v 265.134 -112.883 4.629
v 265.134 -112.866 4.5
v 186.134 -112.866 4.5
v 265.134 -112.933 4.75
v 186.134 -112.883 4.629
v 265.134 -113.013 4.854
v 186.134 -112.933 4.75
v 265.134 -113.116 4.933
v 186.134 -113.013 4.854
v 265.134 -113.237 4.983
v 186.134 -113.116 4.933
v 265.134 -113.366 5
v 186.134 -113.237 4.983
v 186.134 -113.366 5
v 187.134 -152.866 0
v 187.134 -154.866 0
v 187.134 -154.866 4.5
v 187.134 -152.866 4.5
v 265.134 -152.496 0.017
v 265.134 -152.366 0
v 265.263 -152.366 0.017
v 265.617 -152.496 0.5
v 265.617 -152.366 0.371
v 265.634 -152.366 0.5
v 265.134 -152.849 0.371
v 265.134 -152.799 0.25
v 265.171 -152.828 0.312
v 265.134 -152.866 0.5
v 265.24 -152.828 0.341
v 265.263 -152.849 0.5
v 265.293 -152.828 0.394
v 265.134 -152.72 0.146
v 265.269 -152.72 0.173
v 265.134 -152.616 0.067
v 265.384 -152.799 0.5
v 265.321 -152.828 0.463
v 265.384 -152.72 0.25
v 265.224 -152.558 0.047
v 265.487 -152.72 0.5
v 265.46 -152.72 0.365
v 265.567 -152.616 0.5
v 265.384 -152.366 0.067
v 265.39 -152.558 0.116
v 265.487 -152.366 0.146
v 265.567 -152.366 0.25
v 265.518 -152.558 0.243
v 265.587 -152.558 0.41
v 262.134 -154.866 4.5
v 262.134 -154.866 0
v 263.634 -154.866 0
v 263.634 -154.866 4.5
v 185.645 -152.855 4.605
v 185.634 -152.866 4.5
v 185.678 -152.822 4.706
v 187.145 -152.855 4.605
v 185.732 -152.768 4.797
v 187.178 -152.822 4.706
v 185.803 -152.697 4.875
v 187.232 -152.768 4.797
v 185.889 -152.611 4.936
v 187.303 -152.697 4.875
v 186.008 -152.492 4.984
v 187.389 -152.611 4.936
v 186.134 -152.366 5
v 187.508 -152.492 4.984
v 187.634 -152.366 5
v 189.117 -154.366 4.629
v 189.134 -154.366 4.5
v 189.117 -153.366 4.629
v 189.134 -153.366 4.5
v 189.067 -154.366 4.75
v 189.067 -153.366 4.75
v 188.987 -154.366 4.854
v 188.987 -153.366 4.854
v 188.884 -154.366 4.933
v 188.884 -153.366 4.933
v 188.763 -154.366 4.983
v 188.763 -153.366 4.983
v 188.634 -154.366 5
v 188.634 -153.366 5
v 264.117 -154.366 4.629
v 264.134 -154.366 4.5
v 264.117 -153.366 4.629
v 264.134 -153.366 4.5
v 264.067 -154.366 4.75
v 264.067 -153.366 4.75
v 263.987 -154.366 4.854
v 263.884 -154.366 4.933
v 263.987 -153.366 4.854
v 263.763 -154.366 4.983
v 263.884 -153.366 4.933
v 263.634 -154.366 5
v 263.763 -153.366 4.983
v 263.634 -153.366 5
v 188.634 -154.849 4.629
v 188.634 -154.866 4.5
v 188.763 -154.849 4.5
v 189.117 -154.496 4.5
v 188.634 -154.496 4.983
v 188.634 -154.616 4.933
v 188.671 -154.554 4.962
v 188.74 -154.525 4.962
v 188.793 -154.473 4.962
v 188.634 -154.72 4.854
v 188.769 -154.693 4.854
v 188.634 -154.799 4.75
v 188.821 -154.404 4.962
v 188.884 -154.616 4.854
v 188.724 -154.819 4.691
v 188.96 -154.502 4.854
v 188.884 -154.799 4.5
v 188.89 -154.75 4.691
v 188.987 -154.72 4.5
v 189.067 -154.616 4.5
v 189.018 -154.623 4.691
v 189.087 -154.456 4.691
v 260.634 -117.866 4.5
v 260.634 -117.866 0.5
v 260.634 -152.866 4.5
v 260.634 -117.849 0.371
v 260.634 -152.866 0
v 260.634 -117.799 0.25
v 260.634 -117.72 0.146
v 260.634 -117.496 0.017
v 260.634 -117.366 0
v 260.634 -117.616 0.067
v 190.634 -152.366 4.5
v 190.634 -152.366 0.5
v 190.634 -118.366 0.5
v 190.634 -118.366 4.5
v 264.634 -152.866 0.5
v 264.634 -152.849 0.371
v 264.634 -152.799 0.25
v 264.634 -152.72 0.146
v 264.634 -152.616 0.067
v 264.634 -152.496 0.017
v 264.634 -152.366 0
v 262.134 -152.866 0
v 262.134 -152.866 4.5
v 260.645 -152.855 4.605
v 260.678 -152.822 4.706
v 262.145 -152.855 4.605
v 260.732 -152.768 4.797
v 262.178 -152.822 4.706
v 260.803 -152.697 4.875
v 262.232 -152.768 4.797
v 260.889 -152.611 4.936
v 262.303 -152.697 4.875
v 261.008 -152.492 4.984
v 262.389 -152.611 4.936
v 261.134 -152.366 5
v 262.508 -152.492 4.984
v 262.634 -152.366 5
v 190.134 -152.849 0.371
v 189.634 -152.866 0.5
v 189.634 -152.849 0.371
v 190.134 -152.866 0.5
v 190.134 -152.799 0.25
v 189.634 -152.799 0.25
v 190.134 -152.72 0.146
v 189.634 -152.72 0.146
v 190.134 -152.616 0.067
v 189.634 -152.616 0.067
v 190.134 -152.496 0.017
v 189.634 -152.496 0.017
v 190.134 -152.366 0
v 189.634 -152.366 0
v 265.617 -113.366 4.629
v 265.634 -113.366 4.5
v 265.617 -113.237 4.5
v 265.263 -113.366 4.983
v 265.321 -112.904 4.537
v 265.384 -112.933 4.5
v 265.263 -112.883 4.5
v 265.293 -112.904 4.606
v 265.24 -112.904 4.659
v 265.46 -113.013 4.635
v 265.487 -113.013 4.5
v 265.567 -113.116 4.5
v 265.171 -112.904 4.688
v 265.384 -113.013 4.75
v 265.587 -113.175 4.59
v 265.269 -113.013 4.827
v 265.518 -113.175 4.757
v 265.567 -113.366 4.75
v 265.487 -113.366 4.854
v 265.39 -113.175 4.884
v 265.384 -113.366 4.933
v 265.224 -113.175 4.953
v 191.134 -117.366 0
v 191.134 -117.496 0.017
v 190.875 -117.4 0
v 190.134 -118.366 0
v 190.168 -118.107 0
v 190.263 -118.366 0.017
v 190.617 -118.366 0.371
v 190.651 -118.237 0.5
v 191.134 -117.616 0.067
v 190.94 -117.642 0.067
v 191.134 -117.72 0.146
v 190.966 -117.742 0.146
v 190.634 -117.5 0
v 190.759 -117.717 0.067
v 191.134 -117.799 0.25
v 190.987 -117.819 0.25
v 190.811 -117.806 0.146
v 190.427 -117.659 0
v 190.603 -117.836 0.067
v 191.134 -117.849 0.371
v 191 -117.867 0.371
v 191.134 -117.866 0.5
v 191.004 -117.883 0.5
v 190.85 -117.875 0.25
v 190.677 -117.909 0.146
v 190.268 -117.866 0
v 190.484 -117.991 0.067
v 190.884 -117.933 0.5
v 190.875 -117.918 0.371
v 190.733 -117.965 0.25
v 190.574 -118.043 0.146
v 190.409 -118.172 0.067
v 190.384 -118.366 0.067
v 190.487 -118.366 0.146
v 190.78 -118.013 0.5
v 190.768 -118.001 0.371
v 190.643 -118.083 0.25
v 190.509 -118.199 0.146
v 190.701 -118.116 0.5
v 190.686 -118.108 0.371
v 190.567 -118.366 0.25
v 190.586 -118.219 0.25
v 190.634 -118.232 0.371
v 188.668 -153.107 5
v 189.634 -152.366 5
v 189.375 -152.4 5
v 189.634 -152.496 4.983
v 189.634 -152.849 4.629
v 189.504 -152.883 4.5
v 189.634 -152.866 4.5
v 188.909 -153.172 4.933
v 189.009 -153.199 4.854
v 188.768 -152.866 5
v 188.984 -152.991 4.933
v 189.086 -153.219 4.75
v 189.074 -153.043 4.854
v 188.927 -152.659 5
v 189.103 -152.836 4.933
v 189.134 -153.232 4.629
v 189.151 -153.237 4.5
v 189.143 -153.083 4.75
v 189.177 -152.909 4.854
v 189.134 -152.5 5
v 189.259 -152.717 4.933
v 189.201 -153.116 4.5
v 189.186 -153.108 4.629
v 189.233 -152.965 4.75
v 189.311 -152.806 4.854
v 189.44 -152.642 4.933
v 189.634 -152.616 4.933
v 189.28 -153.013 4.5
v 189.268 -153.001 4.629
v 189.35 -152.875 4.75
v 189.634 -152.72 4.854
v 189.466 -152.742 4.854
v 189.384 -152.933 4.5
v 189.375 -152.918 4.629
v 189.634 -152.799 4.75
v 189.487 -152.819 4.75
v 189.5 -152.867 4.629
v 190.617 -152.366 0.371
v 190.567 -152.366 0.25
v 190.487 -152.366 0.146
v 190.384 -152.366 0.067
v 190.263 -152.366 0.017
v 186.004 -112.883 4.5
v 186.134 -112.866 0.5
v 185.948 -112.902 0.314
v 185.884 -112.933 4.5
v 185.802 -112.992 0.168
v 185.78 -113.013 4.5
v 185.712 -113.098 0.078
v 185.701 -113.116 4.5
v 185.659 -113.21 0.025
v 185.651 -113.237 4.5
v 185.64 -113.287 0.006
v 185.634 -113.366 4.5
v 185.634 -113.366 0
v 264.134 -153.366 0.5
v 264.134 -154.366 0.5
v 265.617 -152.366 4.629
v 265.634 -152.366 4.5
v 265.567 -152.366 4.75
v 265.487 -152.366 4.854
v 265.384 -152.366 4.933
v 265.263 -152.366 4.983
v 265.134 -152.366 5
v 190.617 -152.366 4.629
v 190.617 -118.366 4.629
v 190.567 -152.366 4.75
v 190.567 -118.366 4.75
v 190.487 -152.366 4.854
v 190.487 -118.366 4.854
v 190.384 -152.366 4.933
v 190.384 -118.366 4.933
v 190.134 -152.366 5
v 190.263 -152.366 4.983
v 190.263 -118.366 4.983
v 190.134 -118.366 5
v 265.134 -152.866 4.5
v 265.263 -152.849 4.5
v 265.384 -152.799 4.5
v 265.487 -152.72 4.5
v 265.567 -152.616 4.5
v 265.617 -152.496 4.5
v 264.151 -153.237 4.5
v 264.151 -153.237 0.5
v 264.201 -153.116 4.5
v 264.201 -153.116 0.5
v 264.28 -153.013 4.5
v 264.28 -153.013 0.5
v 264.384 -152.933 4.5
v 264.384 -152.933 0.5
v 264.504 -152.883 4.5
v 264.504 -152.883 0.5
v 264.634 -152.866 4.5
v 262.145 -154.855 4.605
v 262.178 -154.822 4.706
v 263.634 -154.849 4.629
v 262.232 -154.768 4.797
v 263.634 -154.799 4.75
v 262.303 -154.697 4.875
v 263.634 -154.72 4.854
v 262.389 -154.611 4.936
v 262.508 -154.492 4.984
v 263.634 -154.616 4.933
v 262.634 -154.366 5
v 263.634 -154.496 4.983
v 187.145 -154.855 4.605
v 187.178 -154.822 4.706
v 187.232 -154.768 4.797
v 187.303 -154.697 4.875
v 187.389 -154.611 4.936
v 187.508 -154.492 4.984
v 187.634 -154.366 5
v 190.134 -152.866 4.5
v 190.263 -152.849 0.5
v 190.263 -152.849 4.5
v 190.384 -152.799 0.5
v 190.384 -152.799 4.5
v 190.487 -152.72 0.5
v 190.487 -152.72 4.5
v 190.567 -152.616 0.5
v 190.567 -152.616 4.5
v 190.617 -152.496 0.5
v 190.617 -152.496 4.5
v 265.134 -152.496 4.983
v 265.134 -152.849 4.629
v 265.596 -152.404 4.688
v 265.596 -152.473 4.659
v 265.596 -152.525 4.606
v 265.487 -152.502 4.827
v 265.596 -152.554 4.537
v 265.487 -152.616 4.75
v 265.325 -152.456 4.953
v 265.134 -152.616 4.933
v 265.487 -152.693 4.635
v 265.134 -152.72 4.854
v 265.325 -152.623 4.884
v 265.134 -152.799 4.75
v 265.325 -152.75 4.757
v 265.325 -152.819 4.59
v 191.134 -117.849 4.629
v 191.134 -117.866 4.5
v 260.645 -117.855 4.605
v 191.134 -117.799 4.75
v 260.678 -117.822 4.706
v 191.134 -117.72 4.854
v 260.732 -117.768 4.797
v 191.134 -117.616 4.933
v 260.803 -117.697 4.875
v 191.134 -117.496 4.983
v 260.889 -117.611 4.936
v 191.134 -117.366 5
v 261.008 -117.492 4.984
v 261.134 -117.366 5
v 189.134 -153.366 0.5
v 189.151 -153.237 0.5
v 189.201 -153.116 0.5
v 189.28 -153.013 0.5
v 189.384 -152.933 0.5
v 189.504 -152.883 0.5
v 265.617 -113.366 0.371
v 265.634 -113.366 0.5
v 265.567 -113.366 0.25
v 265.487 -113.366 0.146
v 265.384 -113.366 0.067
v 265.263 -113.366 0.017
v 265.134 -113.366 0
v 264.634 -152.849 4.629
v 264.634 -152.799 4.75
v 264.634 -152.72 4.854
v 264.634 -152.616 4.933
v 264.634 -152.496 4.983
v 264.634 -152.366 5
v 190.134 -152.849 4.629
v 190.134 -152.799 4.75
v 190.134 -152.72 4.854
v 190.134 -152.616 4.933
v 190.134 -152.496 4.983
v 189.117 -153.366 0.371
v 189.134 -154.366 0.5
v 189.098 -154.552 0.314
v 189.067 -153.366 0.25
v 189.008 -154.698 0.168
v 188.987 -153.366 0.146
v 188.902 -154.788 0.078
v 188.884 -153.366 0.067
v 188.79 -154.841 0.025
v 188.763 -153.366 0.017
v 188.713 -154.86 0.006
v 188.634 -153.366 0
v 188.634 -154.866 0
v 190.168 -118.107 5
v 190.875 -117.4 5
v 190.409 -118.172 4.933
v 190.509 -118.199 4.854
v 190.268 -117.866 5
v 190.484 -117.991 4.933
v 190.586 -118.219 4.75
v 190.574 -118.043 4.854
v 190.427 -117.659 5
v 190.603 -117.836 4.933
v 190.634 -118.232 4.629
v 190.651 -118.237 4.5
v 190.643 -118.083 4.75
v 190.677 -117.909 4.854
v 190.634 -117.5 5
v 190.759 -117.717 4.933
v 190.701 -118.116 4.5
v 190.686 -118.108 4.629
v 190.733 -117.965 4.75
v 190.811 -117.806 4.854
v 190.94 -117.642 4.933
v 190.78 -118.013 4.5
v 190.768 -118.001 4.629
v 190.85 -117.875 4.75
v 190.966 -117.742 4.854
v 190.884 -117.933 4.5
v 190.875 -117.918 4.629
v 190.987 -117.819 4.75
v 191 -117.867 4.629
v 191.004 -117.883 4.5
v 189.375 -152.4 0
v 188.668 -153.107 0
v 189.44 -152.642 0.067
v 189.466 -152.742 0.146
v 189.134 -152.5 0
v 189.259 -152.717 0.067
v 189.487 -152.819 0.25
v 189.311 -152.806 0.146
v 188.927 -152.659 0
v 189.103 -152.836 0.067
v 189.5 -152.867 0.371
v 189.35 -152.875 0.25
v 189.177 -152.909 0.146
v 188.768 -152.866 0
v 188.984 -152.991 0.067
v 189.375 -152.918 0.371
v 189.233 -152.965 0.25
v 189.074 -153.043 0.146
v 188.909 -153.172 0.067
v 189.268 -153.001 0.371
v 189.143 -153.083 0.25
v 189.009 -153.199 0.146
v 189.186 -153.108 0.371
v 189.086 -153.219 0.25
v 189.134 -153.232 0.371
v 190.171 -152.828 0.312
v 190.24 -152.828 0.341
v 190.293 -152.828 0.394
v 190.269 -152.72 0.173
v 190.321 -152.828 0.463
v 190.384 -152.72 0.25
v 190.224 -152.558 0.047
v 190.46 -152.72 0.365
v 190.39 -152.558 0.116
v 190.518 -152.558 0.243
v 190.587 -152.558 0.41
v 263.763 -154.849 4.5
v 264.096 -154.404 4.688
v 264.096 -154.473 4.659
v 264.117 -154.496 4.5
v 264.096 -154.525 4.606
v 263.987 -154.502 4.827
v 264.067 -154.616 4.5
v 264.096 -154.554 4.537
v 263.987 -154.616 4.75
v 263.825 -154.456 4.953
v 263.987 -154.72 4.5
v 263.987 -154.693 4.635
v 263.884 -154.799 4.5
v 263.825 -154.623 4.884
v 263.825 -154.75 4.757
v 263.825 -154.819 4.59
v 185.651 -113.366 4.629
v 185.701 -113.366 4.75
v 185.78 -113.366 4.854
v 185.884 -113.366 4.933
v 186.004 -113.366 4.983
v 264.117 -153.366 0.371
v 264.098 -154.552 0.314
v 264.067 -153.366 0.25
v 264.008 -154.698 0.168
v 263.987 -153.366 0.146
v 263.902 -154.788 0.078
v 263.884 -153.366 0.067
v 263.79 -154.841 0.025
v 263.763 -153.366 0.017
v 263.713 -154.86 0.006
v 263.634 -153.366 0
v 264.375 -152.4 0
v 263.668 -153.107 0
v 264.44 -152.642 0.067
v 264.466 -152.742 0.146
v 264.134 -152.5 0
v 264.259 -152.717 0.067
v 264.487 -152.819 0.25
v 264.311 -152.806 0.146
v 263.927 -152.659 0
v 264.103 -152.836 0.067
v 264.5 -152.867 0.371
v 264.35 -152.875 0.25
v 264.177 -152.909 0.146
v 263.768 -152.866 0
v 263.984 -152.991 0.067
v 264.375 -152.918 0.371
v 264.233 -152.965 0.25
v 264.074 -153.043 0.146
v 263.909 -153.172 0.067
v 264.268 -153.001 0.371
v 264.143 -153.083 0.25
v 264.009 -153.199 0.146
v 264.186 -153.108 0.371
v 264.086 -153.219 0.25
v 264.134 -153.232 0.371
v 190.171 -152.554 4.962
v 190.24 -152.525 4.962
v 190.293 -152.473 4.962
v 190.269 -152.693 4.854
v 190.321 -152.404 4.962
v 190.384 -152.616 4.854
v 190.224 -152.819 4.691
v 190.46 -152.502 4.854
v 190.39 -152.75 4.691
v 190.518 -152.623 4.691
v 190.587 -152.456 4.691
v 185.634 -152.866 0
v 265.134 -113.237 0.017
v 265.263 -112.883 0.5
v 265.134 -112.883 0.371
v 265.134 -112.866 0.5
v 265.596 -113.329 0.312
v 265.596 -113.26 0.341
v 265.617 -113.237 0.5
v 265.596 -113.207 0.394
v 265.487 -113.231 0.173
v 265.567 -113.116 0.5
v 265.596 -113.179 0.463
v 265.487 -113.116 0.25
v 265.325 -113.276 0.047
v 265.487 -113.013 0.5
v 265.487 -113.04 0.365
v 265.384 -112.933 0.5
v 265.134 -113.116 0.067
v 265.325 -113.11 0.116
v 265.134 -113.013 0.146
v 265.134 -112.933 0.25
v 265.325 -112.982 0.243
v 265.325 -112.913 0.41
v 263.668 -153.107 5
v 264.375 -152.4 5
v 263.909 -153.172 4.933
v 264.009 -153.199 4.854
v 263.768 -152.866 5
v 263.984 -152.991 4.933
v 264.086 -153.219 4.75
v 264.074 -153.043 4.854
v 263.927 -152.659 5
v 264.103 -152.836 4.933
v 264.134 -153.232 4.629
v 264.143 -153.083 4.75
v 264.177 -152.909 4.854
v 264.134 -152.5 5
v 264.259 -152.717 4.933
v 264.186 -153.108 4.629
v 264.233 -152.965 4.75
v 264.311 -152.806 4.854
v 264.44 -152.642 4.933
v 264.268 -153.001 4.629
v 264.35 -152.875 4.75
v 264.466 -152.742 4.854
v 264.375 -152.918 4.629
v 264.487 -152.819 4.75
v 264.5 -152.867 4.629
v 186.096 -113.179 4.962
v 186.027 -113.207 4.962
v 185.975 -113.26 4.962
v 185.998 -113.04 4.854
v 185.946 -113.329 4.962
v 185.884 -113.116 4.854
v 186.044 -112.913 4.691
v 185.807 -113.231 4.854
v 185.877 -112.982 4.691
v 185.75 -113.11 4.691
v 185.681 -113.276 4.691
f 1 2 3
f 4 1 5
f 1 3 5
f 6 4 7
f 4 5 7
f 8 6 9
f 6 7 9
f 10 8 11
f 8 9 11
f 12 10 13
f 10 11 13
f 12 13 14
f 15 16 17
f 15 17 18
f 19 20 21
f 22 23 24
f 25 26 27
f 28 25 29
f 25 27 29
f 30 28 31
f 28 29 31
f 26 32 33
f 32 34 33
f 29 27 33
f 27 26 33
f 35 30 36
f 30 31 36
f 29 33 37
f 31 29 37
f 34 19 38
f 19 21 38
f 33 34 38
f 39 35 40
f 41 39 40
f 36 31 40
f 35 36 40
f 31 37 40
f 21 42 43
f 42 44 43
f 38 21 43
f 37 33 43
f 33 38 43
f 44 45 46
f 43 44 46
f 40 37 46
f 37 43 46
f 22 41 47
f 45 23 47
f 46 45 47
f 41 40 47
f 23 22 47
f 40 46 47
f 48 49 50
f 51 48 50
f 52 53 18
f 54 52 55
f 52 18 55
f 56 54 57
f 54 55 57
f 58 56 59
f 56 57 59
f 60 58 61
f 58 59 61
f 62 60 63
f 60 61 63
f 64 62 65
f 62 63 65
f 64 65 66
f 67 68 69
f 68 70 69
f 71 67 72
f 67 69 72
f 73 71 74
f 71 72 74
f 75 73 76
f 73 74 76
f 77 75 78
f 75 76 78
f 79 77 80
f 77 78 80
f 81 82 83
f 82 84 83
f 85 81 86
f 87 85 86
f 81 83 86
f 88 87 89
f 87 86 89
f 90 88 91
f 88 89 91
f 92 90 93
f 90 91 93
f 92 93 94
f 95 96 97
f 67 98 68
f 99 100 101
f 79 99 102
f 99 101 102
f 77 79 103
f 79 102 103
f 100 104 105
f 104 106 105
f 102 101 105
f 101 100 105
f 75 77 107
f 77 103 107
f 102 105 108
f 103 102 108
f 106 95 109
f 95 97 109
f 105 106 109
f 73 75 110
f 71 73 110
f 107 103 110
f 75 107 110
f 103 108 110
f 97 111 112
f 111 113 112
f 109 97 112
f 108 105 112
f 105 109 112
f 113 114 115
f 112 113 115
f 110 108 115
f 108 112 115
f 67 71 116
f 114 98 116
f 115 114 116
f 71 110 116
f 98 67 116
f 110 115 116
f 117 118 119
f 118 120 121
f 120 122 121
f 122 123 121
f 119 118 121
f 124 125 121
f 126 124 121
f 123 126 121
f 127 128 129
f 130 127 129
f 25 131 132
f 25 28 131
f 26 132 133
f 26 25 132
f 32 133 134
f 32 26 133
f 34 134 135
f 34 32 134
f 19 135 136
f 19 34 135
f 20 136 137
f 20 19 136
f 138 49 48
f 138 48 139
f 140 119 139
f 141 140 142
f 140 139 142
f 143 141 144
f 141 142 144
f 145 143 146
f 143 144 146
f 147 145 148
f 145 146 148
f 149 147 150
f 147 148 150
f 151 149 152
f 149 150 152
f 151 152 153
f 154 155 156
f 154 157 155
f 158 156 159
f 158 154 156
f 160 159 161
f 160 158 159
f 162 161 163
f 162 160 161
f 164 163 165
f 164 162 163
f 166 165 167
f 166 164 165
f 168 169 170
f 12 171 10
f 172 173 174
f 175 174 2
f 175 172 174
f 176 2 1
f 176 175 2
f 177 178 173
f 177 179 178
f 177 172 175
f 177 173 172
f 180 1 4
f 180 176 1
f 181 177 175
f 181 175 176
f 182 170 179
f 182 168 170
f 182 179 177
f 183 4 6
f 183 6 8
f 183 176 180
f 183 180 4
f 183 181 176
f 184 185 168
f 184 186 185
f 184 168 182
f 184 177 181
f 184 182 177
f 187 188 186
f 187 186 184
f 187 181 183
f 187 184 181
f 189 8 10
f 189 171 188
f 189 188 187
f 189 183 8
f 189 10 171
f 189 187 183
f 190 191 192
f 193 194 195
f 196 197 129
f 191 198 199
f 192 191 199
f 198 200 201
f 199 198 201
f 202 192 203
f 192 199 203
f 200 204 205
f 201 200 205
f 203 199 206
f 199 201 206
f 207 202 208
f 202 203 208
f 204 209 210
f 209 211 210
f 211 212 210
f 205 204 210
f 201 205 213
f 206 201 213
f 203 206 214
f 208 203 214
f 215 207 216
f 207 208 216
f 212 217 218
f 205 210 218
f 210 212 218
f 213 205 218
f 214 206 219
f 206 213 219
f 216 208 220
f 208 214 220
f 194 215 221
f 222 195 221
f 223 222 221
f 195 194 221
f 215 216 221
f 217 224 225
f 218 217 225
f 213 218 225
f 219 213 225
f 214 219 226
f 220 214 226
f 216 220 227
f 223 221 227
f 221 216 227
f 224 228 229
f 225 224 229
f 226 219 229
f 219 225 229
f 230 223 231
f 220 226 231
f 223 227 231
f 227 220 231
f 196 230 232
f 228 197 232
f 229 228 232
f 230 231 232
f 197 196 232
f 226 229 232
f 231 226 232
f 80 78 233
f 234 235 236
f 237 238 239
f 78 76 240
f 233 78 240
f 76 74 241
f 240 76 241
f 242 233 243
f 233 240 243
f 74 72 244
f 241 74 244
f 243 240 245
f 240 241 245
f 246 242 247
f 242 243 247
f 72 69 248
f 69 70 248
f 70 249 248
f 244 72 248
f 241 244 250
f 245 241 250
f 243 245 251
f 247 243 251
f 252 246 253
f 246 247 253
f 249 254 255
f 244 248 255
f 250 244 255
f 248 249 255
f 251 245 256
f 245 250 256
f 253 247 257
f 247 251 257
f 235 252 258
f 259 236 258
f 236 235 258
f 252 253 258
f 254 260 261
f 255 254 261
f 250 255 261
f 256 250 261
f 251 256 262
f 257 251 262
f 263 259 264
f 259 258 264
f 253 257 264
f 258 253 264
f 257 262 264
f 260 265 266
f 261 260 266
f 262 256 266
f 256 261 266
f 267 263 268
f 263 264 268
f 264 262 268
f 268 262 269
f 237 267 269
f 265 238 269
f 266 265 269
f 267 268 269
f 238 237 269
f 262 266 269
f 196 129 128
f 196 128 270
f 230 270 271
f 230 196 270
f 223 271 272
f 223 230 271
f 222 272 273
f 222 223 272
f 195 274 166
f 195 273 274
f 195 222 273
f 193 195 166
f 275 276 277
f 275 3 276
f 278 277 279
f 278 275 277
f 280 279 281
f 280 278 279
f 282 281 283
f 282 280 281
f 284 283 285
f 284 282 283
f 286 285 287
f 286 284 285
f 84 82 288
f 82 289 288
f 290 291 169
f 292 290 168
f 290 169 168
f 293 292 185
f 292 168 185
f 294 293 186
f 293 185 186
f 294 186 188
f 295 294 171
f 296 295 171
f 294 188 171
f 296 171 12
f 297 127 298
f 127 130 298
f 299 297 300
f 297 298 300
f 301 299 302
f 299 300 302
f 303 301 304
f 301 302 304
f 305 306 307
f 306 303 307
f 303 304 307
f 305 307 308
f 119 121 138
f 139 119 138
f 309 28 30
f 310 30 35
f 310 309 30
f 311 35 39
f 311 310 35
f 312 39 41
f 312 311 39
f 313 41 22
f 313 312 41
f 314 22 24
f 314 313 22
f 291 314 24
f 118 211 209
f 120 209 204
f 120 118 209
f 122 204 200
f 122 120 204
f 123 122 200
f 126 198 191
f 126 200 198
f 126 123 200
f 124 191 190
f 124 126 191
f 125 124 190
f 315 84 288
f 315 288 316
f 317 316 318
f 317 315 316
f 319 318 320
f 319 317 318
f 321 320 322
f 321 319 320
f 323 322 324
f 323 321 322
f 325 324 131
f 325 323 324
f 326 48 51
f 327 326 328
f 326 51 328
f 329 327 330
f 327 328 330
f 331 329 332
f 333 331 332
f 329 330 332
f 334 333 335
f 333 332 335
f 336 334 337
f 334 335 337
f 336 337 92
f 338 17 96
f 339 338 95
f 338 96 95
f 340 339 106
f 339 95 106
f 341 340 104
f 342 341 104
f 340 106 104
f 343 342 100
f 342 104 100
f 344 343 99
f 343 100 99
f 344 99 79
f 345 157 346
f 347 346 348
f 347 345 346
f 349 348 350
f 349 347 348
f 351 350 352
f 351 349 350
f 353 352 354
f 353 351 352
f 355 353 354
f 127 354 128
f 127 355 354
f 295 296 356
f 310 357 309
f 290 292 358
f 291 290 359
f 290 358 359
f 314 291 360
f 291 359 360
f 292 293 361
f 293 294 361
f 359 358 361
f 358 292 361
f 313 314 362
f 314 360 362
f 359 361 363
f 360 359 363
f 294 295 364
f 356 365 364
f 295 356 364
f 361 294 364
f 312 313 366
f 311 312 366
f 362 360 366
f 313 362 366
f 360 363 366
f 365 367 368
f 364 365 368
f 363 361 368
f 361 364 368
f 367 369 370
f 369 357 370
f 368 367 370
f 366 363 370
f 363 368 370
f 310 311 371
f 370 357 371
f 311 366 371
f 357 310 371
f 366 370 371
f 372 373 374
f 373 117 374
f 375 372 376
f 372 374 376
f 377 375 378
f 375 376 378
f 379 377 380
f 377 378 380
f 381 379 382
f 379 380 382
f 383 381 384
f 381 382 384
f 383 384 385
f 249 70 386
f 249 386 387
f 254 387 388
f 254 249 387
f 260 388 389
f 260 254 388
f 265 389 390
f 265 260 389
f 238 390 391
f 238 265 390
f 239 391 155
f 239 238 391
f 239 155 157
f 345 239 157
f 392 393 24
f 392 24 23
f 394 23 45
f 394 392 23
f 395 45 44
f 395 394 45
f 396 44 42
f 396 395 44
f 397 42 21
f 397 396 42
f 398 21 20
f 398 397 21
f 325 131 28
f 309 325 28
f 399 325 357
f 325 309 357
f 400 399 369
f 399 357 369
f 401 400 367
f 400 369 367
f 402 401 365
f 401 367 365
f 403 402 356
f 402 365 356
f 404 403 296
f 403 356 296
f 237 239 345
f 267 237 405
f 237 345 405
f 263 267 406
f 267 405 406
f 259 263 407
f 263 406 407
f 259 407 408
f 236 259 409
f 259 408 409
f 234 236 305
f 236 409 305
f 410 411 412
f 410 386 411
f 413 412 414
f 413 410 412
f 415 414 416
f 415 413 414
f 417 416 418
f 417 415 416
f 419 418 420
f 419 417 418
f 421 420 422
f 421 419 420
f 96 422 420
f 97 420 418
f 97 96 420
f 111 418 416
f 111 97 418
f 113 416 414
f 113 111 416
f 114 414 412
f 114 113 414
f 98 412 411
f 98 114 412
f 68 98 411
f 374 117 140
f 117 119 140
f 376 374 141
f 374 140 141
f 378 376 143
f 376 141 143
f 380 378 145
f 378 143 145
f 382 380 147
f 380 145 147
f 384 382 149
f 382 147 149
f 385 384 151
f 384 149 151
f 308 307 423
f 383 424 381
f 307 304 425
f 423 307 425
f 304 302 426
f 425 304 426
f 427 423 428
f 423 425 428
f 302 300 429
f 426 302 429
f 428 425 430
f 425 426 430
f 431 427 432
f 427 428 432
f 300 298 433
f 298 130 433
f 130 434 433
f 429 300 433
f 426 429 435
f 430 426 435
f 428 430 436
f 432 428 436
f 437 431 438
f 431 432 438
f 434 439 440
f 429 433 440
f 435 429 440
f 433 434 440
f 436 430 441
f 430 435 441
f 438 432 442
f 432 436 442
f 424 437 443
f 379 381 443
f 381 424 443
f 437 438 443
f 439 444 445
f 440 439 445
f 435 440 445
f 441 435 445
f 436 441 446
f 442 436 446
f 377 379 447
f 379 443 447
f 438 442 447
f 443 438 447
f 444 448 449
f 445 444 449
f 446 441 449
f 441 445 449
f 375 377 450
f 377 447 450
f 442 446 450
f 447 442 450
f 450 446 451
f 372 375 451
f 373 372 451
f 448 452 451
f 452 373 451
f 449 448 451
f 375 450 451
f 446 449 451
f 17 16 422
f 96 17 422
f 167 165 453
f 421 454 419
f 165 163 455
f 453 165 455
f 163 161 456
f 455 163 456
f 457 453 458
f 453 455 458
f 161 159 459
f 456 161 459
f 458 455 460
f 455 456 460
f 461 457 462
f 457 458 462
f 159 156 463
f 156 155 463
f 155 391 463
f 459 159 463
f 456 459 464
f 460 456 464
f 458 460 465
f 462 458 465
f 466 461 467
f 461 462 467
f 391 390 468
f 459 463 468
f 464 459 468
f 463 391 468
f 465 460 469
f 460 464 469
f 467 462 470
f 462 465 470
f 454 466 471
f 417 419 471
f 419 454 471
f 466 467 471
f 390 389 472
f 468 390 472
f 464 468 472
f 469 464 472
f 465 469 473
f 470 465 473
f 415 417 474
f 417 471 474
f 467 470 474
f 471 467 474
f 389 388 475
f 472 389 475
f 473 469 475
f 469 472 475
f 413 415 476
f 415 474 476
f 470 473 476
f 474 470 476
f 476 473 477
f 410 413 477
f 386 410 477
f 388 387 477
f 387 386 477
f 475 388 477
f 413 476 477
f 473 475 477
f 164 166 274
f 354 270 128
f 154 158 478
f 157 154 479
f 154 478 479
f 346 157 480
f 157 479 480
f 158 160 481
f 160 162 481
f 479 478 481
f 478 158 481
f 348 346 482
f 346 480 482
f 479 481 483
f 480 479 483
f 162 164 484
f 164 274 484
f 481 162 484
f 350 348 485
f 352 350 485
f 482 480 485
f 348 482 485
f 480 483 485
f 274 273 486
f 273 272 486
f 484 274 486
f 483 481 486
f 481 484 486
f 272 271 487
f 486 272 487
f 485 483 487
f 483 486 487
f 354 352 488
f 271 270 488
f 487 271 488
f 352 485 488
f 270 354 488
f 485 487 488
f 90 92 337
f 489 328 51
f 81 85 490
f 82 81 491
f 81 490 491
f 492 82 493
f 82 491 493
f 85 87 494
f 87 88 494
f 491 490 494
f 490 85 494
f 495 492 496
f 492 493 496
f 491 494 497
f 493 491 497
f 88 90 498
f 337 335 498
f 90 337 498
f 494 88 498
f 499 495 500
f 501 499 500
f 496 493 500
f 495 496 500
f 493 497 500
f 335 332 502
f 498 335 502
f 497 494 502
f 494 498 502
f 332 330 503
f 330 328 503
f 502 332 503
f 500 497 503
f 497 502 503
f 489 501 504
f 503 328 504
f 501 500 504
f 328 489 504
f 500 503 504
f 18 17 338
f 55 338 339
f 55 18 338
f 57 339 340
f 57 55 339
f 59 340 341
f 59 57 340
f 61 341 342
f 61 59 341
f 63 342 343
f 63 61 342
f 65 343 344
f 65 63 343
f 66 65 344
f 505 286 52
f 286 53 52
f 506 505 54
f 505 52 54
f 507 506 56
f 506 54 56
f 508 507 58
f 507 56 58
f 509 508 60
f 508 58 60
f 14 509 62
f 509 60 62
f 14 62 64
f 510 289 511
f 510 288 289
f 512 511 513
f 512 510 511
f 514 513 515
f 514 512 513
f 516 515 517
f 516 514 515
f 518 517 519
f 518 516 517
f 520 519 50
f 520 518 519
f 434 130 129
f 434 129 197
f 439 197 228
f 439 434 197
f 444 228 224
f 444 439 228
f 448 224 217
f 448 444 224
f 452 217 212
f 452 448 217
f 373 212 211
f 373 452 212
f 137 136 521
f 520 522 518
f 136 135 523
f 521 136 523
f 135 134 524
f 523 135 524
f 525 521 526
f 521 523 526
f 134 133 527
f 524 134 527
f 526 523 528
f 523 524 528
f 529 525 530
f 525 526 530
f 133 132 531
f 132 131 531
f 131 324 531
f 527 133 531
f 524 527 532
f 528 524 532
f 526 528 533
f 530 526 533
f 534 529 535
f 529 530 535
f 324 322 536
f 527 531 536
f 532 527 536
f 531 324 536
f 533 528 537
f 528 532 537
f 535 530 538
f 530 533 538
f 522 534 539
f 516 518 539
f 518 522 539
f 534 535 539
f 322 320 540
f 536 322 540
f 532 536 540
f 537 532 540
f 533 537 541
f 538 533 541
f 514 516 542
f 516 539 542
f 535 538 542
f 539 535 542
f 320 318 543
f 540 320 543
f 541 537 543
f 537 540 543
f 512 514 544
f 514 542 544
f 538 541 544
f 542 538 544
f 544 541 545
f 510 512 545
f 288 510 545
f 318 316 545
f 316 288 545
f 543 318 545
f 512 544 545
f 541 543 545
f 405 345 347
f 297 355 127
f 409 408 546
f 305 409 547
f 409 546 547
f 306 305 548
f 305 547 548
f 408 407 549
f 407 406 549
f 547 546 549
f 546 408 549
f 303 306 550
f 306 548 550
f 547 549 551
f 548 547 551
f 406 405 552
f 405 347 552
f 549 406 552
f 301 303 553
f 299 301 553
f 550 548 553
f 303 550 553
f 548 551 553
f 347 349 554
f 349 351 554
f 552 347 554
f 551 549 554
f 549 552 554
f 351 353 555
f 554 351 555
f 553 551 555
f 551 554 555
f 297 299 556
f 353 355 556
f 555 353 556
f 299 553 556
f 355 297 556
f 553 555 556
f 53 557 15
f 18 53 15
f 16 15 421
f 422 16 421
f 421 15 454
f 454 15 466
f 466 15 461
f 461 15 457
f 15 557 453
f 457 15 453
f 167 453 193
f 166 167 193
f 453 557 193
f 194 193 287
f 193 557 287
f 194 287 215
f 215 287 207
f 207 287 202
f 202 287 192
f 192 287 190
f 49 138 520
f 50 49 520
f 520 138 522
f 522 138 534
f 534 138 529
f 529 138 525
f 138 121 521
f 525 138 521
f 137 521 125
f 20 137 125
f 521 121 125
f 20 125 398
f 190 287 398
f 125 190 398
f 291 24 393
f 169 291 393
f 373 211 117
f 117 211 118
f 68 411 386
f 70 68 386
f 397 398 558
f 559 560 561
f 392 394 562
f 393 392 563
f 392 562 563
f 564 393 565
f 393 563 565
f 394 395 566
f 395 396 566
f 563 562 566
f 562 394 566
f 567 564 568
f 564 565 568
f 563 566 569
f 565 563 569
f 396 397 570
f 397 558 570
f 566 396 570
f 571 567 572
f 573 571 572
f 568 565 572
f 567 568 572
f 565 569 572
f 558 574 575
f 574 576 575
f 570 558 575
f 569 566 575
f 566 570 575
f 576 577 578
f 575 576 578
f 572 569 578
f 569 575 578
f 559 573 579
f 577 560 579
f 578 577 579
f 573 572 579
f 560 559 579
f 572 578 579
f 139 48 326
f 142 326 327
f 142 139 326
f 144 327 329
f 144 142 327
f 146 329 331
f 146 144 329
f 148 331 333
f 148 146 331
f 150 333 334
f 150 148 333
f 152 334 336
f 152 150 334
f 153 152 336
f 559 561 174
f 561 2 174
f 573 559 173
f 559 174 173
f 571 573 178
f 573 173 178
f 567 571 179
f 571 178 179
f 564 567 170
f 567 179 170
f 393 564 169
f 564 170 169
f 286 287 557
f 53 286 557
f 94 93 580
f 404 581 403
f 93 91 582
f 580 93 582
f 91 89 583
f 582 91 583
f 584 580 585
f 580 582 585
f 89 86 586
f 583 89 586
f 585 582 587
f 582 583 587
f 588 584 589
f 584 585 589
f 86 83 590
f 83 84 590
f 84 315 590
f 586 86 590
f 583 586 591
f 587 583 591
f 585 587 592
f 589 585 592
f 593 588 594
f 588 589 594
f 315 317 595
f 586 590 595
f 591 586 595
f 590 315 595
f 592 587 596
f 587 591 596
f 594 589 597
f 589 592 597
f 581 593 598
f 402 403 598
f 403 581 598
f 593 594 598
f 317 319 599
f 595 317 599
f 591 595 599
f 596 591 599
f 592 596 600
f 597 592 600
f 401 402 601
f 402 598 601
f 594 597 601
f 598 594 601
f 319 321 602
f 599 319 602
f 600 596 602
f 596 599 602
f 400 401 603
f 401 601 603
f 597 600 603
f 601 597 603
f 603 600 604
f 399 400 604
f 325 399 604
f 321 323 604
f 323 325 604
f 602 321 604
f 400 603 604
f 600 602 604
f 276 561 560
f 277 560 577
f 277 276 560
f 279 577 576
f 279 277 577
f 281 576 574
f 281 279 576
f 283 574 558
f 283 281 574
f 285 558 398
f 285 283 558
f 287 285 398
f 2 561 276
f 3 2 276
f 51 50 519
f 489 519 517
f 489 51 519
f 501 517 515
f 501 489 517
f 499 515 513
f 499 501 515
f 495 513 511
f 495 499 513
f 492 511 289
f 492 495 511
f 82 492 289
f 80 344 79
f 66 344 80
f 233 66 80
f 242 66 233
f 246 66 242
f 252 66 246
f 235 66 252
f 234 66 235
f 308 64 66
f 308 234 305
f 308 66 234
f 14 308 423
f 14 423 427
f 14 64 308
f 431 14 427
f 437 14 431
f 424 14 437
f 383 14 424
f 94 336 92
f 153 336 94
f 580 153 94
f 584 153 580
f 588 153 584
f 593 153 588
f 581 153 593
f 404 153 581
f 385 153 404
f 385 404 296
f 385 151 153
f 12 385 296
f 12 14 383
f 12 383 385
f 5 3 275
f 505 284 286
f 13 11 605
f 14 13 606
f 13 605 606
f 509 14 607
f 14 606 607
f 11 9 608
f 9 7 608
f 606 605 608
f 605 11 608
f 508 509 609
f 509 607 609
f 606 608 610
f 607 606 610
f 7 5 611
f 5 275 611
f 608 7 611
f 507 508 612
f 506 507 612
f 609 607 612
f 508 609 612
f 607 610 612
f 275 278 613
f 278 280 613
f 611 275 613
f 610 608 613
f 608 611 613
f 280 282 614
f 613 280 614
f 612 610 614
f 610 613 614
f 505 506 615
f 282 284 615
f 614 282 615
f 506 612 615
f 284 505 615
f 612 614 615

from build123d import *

# Parameters (mm, degrees)
SKETCH1_W           = 2
SKETCH1_H           = 2
BOSS_EXTRUDE1_DEPTH = 5
FILLET1_R           = 0.5


with BuildPart() as part:
    # Sketch1 → Boss-Extrude1 (new body)
    with BuildSketch(Plane.XY):
        Polygon((265.633757962, -112.866242038), (185.633757962, -112.866242038), (185.633757962, -152.866242038), (187.133757962, -152.866242038), (189.133757962, -152.866242038), (190.633757962, -152.866242038), (190.633757962, -117.866242038), (260.633757962, -117.866242038), (260.633757962, -152.866242038), (262.133757962, -152.866242038), (264.133757962, -152.866242038), (265.633757962, -152.866242038), align=None)
        with Locations((188.133757962, -153.866242038)):
            Rectangle(SKETCH1_W, SKETCH1_H)
        with Locations((263.133757962, -153.866242038)):
            Rectangle(SKETCH1_W, SKETCH1_H)
    extrude(amount=BOSS_EXTRUDE1_DEPTH)

    # Fillet1
    fillet1_edges = [part.edges().sort_by_distance(p)[0] for p in [
        (262.133757962, -153.866242038, 5),
        (225.633757962, -117.866242038, 0),
        (190.633757962, -135.366242038, 0),
        (263.133757962, -154.866242038, 5),
        (189.883757962, -152.866242038, 0),
        (189.133757962, -153.866242038, 0),
        (225.633757962, -112.866242038, 0),
        (265.633757962, -132.866242038, 0),
        (264.133757962, -153.866242038, 5),
        (264.883757962, -152.866242038, 0),
        (264.133757962, -153.866242038, 0),
        (264.883757962, -152.866242038, 5),
        (265.633757962, -132.866242038, 5),
        (190.633757962, -117.866242038, 2.5),
        (190.633757962, -152.866242038, 2.5),
        (189.133757962, -152.866242038, 2.5),
        (189.133757962, -154.866242038, 2.5),
        (185.633757962, -112.866242038, 2.5),
        (265.633757962, -112.866242038, 2.5),
        (265.633757962, -152.866242038, 2.5),
        (264.133757962, -152.866242038, 2.5),
        (264.133757962, -154.866242038, 2.5),
        (225.633757962, -112.866242038, 5),
        (185.633757962, -132.866242038, 5),
        (260.633757962, -135.366242038, 5),
        (186.383757962, -152.866242038, 5),
        (187.133757962, -153.866242038, 5),
        (188.133757962, -154.866242038, 5),
        (189.133757962, -153.866242038, 5),
        (189.883757962, -152.866242038, 5),
        (190.633757962, -135.366242038, 5),
        (225.633757962, -117.866242038, 5),
        (261.383757962, -152.866242038, 5),
    ]]
    fillet(fillet1_edges, radius=FILLET1_R)


solid = part.part
